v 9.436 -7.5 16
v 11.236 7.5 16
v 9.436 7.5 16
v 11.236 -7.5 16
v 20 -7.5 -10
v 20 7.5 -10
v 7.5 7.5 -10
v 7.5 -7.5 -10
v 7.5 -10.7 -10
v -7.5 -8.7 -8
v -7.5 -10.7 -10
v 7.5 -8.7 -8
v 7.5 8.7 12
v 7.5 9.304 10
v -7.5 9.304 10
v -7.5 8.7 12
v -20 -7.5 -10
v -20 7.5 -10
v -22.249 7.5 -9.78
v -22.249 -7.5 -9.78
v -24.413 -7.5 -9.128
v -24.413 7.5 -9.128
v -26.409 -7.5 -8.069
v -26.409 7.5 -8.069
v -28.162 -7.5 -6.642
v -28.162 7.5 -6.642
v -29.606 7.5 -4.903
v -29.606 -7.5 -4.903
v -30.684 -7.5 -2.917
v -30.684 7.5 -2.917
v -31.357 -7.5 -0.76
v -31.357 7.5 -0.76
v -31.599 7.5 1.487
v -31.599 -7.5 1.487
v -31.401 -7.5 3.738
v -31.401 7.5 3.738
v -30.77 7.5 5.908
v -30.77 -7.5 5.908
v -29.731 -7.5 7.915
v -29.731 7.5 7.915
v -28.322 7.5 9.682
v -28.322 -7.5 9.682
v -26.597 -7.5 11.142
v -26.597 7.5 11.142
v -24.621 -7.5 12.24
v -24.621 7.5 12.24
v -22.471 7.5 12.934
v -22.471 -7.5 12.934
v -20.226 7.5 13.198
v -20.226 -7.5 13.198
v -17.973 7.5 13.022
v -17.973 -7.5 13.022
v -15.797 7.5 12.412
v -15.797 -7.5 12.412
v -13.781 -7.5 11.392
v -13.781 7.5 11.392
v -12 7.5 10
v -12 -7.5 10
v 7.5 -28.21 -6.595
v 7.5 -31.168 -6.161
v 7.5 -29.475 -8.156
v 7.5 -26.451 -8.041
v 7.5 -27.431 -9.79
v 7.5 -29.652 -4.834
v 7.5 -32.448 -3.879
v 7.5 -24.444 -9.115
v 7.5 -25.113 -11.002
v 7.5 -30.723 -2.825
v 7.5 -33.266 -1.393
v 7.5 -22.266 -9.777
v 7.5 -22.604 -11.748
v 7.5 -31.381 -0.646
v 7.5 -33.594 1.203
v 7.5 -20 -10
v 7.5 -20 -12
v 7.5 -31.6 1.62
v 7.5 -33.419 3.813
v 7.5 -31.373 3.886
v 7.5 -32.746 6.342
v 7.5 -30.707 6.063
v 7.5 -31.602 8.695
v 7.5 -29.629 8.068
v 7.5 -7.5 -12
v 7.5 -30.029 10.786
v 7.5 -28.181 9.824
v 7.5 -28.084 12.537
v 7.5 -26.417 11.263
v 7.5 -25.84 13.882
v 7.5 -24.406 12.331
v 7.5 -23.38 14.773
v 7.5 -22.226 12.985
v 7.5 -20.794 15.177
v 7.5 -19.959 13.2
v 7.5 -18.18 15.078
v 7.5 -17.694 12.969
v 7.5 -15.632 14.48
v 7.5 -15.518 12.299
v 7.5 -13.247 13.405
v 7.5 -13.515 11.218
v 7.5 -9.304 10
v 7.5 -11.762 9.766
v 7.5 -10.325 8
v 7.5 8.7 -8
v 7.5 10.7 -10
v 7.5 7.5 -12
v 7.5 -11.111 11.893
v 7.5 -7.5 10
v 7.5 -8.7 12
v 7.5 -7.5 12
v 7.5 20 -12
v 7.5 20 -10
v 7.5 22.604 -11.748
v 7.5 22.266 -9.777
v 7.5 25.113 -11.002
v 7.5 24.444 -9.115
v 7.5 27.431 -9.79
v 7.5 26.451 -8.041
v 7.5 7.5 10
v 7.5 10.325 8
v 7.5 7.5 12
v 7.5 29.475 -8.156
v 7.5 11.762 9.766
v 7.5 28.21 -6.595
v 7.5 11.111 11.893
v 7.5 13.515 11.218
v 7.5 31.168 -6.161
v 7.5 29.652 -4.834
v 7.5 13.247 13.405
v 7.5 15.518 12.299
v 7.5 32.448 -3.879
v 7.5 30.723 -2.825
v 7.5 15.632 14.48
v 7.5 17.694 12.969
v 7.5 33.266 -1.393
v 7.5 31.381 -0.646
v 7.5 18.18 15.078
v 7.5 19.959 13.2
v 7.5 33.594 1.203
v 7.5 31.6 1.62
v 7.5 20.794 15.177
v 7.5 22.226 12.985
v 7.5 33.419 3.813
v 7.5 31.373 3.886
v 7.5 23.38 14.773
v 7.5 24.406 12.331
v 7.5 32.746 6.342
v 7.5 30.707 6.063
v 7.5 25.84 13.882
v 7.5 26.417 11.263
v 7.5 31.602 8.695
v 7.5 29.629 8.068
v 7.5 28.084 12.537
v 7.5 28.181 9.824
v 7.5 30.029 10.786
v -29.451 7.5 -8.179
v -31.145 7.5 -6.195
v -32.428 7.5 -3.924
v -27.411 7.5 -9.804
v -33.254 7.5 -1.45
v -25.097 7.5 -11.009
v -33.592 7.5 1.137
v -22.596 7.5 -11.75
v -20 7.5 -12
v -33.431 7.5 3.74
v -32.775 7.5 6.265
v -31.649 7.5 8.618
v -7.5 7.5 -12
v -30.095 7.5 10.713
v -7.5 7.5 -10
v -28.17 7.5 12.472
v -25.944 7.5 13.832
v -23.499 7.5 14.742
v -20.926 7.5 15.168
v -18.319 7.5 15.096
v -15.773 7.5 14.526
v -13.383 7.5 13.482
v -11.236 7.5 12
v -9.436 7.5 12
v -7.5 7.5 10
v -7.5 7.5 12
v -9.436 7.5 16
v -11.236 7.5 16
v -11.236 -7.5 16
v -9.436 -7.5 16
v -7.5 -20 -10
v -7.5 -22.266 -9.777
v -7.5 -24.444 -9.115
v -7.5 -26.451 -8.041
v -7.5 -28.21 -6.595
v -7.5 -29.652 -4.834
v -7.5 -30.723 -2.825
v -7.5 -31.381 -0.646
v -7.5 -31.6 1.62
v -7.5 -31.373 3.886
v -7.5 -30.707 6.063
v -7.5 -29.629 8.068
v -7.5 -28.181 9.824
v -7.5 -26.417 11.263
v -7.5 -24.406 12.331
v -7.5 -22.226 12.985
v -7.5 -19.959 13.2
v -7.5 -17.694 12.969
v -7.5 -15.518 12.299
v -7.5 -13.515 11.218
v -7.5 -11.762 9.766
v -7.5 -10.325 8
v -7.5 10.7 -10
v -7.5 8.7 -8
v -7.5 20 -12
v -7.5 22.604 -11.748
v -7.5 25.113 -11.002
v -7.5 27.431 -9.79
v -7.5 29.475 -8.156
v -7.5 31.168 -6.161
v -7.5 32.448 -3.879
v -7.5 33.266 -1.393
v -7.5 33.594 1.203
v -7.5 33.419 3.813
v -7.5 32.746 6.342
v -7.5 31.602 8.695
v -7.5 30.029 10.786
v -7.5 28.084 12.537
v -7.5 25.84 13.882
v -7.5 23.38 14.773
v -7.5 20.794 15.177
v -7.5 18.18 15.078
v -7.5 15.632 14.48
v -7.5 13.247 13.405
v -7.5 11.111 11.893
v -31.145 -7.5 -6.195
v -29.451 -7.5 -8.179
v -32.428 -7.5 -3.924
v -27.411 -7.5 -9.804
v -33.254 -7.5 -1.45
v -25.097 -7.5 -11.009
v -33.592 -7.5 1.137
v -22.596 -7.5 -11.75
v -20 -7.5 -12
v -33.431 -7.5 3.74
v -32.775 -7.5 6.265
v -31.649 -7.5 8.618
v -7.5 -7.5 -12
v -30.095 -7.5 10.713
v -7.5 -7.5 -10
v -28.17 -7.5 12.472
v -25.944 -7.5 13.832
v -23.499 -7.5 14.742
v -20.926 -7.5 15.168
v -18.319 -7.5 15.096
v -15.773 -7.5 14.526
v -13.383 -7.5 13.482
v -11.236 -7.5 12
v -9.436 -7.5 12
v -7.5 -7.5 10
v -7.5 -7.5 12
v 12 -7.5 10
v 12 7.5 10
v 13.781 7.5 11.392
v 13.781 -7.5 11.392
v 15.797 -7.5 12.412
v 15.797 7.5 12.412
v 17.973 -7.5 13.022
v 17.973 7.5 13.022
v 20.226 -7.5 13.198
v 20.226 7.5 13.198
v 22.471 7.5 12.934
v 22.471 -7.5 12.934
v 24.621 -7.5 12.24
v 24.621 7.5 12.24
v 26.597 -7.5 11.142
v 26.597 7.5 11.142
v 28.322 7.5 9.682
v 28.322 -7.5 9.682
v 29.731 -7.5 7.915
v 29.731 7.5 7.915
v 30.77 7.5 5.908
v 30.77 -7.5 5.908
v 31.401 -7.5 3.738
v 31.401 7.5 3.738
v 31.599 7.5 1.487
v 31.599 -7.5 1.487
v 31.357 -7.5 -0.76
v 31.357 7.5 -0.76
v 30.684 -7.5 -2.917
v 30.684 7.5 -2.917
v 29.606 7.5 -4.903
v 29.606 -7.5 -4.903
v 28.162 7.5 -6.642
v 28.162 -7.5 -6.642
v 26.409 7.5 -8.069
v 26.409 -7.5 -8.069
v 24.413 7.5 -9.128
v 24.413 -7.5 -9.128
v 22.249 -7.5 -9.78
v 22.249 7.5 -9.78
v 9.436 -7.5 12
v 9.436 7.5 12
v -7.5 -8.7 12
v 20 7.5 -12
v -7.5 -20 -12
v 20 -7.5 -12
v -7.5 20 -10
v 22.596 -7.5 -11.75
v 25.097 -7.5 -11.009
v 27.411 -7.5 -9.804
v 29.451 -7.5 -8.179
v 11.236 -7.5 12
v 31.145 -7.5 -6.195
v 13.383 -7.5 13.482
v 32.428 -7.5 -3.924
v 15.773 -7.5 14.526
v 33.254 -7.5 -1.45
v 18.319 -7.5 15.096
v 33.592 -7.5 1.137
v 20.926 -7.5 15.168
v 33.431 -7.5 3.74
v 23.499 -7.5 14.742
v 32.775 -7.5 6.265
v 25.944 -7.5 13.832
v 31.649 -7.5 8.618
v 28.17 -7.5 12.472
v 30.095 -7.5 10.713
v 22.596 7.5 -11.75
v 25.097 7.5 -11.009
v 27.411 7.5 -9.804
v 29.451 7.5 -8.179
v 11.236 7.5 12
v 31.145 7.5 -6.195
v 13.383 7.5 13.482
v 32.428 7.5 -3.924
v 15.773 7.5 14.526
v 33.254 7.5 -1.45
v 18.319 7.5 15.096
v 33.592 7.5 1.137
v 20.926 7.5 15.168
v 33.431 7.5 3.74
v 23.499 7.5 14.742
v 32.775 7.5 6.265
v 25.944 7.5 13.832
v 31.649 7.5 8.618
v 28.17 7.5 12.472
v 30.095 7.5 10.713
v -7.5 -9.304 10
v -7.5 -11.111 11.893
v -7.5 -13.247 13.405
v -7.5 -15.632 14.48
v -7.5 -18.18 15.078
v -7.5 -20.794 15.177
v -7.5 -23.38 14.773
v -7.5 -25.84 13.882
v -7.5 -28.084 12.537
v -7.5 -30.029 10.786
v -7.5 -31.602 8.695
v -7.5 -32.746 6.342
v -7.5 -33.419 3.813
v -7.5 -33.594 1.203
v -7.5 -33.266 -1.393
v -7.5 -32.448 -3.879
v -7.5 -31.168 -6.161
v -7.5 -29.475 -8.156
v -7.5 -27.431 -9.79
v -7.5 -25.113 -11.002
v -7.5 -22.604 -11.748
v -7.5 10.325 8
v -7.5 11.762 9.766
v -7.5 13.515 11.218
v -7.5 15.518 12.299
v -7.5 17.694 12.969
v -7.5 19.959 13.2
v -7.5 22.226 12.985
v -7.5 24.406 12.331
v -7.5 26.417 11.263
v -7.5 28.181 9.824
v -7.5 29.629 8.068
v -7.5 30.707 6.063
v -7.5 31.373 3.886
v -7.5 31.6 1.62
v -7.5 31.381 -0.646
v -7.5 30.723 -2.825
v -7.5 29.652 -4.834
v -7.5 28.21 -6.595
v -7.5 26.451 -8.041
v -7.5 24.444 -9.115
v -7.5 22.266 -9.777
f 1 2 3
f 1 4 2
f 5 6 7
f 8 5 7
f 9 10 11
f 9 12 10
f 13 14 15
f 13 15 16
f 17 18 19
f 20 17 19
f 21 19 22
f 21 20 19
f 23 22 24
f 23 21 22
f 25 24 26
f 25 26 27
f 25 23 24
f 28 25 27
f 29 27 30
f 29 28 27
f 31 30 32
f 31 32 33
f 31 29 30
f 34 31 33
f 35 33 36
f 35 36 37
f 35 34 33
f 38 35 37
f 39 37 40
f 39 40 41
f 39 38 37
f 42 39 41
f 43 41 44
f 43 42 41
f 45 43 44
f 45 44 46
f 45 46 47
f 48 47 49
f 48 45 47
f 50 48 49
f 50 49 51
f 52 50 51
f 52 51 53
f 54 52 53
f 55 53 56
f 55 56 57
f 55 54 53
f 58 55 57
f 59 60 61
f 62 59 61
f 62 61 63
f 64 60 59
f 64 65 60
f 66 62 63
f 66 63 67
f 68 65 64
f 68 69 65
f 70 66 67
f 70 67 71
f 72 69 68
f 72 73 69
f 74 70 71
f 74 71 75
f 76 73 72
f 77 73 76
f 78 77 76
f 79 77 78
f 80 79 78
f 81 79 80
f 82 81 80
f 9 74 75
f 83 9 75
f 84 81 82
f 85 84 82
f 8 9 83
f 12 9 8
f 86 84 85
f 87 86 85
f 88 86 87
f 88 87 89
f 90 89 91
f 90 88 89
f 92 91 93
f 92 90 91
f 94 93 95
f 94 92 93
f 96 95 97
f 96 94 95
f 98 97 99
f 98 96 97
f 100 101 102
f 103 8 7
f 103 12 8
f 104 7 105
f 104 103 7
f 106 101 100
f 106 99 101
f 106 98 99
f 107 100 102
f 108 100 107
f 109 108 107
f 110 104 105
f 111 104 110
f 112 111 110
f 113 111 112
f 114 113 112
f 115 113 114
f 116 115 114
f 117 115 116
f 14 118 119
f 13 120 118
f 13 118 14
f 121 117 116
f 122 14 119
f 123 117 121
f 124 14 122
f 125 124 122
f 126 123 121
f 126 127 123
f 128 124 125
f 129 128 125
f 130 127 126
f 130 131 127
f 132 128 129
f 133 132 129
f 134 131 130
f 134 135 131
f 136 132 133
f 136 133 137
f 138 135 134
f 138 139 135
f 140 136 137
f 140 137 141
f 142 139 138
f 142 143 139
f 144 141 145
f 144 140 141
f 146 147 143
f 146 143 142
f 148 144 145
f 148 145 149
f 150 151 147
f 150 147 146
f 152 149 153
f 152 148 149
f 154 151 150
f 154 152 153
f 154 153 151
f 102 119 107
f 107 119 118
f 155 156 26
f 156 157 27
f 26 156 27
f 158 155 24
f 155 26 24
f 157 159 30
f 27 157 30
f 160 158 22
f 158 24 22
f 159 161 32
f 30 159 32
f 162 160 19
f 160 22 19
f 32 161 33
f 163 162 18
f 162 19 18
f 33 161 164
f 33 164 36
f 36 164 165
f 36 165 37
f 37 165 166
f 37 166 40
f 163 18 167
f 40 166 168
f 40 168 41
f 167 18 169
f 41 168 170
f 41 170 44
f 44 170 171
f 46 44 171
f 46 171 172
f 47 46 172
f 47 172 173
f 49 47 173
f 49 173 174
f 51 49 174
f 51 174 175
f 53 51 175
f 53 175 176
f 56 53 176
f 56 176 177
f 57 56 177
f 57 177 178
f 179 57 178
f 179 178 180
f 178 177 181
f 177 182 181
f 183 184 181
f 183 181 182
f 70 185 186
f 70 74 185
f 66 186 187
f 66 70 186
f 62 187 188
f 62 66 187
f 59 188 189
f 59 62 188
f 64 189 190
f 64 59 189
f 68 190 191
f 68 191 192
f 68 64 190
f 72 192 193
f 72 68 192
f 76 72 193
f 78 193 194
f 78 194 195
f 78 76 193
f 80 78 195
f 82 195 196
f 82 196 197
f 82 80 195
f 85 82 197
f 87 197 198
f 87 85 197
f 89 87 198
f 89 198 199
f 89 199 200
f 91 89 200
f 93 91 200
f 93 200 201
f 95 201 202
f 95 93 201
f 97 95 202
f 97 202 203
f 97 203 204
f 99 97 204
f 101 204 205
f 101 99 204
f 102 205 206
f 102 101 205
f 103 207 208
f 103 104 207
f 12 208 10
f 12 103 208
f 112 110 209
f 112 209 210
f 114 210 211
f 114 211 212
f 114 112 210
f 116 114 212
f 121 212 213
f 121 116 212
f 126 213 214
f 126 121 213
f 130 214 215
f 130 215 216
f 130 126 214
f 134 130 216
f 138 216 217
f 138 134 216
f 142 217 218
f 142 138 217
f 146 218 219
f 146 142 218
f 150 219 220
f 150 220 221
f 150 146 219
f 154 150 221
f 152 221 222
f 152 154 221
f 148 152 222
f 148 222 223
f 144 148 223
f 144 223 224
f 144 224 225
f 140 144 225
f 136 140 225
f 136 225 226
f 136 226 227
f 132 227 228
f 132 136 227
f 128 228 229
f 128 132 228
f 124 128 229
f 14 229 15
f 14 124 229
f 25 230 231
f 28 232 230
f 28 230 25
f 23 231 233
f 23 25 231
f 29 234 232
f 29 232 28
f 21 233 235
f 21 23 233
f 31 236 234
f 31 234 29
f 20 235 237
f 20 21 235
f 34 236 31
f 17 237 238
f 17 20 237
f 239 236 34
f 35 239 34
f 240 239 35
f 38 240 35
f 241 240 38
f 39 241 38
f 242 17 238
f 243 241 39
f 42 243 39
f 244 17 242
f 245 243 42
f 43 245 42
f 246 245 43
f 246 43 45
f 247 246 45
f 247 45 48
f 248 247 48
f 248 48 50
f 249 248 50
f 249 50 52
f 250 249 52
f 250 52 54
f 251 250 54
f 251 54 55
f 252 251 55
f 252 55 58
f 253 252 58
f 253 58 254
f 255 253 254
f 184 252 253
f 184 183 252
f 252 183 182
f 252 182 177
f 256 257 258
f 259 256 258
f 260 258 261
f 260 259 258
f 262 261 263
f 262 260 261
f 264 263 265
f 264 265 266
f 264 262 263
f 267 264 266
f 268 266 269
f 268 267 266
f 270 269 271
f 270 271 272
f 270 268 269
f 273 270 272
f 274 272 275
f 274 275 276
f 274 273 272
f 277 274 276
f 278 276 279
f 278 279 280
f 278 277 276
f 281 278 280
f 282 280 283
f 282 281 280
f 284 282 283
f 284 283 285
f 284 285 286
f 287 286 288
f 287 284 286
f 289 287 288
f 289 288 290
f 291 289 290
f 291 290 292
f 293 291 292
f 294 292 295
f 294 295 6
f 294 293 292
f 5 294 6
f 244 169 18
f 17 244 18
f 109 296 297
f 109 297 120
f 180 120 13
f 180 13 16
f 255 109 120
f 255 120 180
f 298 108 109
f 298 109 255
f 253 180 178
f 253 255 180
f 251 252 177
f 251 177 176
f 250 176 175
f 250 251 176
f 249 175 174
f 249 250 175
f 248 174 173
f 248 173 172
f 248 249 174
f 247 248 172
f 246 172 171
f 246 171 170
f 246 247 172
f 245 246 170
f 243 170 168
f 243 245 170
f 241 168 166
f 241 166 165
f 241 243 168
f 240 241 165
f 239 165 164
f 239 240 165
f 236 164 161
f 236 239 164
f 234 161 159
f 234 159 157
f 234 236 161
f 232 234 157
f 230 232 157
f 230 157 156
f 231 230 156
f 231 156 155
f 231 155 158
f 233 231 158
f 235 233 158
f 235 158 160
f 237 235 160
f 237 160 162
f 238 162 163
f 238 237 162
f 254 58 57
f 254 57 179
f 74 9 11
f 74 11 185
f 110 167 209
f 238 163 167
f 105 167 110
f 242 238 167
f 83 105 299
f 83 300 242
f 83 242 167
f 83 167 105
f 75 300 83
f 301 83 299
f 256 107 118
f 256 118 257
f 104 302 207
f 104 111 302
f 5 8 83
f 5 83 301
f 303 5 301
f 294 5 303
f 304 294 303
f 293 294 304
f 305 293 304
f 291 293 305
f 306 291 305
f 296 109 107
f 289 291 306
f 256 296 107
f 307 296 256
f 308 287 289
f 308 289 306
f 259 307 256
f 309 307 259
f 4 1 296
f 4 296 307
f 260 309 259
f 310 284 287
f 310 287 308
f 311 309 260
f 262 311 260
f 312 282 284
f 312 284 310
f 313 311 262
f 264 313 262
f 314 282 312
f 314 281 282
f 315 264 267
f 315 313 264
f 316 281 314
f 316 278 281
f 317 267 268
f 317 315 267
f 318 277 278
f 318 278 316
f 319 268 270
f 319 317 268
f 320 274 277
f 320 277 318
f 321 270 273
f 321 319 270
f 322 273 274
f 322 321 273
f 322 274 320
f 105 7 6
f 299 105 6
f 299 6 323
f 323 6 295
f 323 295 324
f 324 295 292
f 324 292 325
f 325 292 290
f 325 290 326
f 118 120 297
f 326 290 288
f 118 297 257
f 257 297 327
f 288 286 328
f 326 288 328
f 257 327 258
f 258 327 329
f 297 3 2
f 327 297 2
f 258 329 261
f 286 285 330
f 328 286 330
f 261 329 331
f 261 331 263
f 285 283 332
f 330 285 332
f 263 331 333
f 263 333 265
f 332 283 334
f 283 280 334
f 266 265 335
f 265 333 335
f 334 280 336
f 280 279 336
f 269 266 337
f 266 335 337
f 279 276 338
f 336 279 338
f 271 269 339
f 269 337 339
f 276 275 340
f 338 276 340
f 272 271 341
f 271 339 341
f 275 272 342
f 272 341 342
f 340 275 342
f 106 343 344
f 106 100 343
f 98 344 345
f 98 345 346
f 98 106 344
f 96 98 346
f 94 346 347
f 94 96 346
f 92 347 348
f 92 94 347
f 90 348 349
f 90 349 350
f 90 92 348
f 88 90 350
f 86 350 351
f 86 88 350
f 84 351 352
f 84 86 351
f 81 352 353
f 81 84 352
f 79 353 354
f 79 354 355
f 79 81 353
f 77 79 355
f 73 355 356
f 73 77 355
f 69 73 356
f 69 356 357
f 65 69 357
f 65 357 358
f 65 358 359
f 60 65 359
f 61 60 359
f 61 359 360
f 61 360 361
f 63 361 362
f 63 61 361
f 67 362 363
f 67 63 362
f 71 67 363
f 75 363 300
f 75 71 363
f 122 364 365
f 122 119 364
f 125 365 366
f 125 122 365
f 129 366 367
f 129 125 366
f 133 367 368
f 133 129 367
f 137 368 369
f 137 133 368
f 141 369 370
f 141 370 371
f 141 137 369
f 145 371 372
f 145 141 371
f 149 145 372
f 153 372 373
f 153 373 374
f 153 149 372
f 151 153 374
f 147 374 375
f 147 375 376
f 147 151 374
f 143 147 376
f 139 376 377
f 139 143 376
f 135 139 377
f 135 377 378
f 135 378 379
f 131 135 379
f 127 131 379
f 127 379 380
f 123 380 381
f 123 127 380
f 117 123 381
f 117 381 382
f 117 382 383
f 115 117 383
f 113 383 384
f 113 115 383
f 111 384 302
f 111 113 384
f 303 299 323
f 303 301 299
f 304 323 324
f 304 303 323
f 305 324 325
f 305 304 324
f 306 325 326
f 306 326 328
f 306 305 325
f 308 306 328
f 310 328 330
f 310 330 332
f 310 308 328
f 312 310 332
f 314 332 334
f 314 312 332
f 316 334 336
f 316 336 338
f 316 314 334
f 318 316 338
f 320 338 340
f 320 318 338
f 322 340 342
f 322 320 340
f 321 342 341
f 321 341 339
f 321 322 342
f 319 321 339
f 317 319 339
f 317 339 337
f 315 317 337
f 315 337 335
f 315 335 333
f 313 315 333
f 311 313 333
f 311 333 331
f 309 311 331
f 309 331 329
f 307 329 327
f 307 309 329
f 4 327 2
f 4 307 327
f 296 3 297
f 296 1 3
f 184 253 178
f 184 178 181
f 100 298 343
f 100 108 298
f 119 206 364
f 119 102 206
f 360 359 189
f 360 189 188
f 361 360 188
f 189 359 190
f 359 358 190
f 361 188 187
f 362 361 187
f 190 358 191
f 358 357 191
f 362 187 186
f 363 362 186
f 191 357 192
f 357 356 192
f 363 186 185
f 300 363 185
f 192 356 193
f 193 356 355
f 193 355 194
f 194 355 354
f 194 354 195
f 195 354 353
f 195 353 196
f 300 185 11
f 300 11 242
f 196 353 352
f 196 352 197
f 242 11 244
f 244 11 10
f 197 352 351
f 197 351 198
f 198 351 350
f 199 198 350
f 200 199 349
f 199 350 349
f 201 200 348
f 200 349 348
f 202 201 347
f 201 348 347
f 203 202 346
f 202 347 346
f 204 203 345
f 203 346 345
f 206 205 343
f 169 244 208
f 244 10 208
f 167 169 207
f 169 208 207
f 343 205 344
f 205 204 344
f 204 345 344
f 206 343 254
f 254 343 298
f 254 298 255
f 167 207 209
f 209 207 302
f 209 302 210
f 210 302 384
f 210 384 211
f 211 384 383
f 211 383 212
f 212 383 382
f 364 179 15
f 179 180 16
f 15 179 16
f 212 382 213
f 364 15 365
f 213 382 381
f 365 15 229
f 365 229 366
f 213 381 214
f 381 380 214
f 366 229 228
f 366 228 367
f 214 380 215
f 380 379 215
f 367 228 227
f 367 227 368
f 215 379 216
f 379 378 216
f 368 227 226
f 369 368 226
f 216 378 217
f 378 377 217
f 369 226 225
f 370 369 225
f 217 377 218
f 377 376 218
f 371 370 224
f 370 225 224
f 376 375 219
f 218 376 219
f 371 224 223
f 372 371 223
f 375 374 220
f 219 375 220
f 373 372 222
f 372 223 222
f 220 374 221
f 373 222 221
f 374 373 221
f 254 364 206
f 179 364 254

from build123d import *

# Parameters (mm, degrees)
F1_DEPTH = 7.5
F3_DEPTH = 7.5


with BuildPart() as f1:
    # F0 (on Front) → F1 (new body, symmetric)
    with BuildSketch(Plane.XZ):
        with BuildLine():
            Line((9.436439, 16), (9.436439, 12))
            Line((9.436439, 12), (-9.436439, 12))
            Line((-9.436439, 12), (-9.436439, 16))
            Line((-9.436439, 16), (-11.236439, 16))
            Line((-11.236439, 16), (-11.236439, 12))
            ThreePointArc((-11.236439, 12), (-32.774976, 6.264762), (-20, -12))
            Line((-20, -12), (20, -12))
            ThreePointArc((20, -12), (32.774976, 6.264762), (11.236439, 12))
            Line((11.236439, 12), (11.236439, 16))
            Line((11.236439, 16), (9.436439, 16))
        make_face()
        with BuildLine():
            Line((-12, 10), (12, 10))
            ThreePointArc((12, 10), (30.77033, 5.908132), (20, -10))
            Line((20, -10), (-20, -10))
            ThreePointArc((-20, -10), (-30.77033, 5.908132), (-12, 10))
        make_face(mode=Mode.SUBTRACT)
    extrude(amount=F1_DEPTH, both=True)

    # F2 (on Right) → F3 (join, symmetric)
    with BuildSketch(Plane.YZ):
        with BuildLine():
            Line((-7.5, -10), (7.5, -10))
            Line((7.5, -10), (7.5, -12))
            Line((7.5, -12), (20, -12))
            ThreePointArc((20, -12), (32.231108, 7.546427), (9.304206, 10))
            Line((9.304206, 10), (8.7, 12))
            Line((8.7, 12), (7.5, 12))
            Line((7.5, 12), (7.5, 10))
            Line((7.5, 10), (-7.5, 10))
            Line((-7.5, 10), (-7.5, 12))
            Line((-7.5, 12), (-8.7, 12))
            Line((-8.7, 12), (-9.304206, 10))
            ThreePointArc((-9.304206, 10), (-32.231108, 7.546427), (-20, -12))
            Line((-20, -12), (-7.5, -12))
            Line((-7.5, -12), (-7.5, -10))
        make_face()
        with BuildLine():
            Line((-10.7, -10), (-20, -10))
            ThreePointArc((-20, -10), (-30.217632, 7.091812), (-10.325291, 8))
            Line((-10.325291, 8), (10.325291, 8))
            ThreePointArc((10.325291, 8), (30.217632, 7.091812), (20, -10))
            Line((20, -10), (10.7, -10))
            Line((10.7, -10), (8.7, -8))
            Line((8.7, -8), (-8.7, -8))
            Line((-8.7, -8), (-10.7, -10))
        make_face(mode=Mode.SUBTRACT)
    extrude(amount=F3_DEPTH, both=True)


solid = f1.part
